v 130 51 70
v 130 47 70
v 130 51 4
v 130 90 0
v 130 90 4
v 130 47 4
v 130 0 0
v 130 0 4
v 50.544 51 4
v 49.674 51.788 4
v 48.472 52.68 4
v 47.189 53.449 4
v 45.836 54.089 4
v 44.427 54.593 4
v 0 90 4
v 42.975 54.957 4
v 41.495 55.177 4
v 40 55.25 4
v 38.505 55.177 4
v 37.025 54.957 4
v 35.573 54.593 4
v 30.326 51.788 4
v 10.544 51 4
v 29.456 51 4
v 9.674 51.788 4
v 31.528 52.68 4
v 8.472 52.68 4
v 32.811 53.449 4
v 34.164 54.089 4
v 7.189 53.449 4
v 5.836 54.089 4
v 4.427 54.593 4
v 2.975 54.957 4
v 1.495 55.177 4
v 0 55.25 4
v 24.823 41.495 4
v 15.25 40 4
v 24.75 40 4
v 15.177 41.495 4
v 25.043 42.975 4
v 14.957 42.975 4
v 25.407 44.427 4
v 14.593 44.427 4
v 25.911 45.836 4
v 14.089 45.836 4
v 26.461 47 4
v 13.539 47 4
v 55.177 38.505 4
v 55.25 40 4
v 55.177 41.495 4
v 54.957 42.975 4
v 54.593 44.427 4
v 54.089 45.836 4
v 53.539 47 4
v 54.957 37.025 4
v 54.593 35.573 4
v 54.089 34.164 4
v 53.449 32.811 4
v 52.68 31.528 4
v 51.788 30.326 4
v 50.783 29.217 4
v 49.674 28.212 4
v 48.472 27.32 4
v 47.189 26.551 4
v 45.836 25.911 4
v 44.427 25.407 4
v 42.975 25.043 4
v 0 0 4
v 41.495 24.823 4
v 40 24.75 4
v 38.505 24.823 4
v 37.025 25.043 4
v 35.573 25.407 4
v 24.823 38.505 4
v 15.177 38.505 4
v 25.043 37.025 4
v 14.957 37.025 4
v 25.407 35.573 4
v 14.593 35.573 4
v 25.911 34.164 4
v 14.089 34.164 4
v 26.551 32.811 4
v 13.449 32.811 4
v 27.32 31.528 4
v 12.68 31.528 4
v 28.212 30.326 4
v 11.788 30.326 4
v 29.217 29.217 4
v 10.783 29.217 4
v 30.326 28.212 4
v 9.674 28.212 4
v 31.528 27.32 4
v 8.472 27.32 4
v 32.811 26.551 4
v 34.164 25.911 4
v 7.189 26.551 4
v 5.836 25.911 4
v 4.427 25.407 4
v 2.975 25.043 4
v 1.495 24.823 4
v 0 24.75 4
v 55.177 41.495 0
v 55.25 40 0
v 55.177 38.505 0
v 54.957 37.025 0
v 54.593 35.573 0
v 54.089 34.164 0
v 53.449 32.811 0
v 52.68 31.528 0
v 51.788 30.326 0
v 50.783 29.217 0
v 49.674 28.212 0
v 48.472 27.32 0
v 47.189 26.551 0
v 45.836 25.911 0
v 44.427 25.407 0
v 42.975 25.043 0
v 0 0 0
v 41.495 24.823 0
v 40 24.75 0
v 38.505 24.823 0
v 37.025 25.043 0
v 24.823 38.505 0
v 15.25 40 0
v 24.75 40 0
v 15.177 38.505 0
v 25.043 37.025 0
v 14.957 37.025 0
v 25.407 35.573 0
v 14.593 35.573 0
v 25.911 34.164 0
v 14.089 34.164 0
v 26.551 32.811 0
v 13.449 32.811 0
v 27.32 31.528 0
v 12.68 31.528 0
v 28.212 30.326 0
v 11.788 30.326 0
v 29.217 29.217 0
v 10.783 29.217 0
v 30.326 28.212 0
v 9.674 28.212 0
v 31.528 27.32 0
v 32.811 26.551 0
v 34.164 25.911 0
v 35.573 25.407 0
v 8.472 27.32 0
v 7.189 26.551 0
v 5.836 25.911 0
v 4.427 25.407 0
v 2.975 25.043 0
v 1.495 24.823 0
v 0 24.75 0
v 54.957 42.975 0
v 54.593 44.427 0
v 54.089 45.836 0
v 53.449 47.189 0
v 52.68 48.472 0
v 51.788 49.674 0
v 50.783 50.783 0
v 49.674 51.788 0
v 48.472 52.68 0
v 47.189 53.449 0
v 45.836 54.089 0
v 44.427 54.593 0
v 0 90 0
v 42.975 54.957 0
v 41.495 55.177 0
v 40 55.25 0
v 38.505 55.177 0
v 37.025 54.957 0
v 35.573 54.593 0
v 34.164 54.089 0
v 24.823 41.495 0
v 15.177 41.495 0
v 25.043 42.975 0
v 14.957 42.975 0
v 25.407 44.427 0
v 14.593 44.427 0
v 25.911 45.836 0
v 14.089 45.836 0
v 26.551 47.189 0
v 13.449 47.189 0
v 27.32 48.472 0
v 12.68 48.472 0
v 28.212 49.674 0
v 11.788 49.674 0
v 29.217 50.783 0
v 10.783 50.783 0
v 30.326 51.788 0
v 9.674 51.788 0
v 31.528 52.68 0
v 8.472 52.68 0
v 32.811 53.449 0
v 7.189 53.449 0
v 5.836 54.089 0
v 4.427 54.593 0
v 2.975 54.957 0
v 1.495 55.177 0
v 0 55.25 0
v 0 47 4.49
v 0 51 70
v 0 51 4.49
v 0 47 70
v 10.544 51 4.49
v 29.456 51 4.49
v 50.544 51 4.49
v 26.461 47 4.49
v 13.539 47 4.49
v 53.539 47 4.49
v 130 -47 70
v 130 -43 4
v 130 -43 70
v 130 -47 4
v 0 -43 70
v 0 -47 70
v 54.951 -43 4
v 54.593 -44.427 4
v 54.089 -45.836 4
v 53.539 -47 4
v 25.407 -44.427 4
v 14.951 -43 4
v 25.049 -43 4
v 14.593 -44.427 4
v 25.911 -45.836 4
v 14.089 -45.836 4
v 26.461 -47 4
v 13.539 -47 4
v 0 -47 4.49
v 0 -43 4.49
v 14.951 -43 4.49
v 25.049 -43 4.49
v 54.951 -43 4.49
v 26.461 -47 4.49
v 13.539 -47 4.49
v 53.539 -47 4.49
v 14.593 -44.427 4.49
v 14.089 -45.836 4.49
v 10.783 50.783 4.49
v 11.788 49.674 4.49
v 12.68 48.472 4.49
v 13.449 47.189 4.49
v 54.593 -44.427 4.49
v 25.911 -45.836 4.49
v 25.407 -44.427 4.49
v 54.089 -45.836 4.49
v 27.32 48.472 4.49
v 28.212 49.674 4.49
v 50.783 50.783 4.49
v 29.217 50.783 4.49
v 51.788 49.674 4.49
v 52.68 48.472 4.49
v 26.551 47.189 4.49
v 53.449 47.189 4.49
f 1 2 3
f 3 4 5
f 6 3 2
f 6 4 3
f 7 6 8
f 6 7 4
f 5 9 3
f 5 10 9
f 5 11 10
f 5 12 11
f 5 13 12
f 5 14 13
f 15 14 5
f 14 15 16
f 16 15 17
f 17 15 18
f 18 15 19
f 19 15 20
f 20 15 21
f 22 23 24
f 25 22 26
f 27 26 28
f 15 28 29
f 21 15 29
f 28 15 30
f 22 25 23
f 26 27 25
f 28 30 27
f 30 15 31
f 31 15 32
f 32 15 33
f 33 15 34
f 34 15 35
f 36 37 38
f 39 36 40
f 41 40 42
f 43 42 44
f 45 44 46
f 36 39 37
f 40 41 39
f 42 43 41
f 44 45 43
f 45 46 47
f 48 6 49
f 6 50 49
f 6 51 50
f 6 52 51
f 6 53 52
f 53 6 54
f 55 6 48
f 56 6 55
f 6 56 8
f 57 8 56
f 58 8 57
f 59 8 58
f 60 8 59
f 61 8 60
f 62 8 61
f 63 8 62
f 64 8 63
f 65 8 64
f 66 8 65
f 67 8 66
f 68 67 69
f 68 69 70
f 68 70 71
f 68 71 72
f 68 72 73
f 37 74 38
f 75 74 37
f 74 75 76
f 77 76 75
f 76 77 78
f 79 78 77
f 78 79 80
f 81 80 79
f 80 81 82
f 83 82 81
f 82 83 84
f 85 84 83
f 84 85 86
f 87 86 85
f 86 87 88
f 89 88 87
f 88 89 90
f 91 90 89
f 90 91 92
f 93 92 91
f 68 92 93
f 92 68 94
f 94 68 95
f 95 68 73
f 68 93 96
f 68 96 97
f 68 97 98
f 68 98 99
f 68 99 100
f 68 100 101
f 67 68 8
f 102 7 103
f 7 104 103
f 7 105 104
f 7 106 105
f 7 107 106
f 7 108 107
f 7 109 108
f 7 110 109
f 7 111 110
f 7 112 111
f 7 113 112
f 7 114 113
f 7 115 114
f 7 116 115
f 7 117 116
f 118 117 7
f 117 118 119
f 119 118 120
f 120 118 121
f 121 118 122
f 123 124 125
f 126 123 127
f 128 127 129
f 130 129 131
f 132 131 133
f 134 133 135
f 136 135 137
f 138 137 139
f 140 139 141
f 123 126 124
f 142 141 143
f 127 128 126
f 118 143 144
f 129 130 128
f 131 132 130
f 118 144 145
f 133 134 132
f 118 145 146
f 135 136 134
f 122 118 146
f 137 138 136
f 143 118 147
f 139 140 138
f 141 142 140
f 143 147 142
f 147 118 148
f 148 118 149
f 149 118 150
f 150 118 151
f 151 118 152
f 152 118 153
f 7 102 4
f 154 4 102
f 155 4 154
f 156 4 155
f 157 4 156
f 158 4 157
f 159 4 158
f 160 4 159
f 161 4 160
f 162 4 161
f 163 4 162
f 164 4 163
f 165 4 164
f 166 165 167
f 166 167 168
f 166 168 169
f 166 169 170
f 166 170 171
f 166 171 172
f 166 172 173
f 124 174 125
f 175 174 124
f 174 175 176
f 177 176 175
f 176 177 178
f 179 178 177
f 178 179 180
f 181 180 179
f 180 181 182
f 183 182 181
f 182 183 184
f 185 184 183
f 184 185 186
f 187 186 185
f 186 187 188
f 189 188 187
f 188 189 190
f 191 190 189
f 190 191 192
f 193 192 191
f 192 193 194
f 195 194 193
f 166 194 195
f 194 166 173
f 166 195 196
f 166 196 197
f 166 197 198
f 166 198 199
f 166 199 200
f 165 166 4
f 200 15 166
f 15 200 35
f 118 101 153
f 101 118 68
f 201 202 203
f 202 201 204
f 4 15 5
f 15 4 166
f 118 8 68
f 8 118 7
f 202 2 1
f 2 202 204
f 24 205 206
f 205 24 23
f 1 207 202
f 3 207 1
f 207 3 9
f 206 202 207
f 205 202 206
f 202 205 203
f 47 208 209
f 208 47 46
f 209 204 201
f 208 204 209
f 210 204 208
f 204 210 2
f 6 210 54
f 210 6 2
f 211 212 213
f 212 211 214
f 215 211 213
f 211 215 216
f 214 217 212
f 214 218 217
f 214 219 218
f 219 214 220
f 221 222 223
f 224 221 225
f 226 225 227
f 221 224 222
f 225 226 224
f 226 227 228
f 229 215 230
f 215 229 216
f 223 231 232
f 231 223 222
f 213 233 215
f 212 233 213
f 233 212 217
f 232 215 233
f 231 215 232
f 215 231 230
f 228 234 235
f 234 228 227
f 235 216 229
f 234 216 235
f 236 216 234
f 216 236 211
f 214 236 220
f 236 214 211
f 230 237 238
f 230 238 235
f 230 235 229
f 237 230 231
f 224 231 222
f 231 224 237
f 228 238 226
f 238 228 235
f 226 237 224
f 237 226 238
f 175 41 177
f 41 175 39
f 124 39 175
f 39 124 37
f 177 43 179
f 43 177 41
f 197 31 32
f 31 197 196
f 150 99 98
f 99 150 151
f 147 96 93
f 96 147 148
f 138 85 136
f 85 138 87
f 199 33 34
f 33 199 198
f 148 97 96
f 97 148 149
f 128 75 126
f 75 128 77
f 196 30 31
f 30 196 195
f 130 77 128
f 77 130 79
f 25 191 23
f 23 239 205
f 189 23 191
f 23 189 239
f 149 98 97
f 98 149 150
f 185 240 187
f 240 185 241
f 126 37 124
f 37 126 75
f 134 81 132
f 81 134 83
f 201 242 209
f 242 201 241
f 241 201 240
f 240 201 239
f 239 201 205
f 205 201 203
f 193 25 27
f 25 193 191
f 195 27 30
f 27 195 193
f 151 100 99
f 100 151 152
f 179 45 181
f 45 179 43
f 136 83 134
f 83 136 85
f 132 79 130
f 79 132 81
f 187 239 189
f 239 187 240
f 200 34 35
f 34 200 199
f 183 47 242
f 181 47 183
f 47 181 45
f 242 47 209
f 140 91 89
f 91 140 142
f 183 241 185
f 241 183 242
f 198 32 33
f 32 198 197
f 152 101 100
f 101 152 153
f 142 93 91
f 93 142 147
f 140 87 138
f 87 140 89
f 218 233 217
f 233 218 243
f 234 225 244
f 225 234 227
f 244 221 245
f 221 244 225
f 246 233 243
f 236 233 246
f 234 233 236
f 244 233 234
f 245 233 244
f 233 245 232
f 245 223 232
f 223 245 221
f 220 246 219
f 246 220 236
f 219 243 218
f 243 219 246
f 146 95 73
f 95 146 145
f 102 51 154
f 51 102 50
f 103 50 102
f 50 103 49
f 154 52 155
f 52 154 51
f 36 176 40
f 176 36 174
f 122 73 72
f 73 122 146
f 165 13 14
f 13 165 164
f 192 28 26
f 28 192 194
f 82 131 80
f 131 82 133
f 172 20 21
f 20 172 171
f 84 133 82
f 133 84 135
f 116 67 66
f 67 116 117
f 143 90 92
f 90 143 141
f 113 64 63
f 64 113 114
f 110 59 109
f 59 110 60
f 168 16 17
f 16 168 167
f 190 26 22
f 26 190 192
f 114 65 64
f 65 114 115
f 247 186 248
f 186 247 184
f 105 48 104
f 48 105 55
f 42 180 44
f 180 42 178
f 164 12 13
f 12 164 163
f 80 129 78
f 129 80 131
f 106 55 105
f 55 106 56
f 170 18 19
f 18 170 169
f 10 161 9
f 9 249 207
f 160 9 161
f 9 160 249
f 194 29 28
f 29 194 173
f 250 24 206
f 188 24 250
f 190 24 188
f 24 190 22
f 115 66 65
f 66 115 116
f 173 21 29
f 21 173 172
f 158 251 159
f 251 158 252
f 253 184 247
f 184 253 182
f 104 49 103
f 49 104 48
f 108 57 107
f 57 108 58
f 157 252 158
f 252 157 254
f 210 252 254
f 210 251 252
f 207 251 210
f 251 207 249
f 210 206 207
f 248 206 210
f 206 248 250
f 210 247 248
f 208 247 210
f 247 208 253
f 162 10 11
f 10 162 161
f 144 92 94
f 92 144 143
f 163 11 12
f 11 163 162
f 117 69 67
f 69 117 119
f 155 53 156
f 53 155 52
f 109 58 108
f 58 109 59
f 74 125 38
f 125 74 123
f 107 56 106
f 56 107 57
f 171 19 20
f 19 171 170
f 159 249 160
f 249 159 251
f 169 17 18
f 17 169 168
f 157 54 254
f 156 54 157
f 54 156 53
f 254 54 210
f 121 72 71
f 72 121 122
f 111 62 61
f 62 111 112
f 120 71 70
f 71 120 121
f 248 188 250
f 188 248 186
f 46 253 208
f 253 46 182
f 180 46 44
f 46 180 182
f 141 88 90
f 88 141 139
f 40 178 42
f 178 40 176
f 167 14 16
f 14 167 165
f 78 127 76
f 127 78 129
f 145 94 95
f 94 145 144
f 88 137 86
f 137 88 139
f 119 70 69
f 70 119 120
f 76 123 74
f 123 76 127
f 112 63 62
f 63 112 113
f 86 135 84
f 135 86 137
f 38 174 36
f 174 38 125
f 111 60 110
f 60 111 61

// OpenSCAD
$fn = 64;

// Plate dimensions
plate_x = 130;      // Length along X
plate_y = 90;       // Width along Y
plate_z = 4;        // Thickness

// Hole dimensions
hole_dia = 30.5;    // Diameter of tube holes

// Hole grid spacing
hole_spacing_x = 40; // Centre-to-centre along X
hole_spacing_y = 40; // Centre-to-centre along Y

// Wall dimensions
wall_x = 130;       // Length along X
wall_y = 4;         // Thickness along Y
wall_h = 66;        // Height above plate (rises to z=70)

// Hole centres (3 along X, 2 along Y)
x_centers = [-hole_spacing_x, 0, hole_spacing_x];
y_centers = [-hole_spacing_y, hole_spacing_y];

difference() {
  union() {
    // Base plate (sits on bed z=0)
    cube([plate_x, plate_y, plate_z]);
    
    // Long walls (flush with plate edges, start at z=4)
    translate([0, plate_y/2 + wall_y/2, plate_z])
      cube([wall_x, wall_y, wall_h]);
      
    translate([0, -plate_y/2 - wall_y/2, plate_z])
      cube([wall_x, wall_y, wall_h]);
  }
  
  // Through-holes
  for (x = x_centers) {
    for (y = y_centers) {
      translate([x, y, -0.01])
        cylinder(d = hole_dia, h = plate_z + 0.5, center = false);
    }
  }
}
